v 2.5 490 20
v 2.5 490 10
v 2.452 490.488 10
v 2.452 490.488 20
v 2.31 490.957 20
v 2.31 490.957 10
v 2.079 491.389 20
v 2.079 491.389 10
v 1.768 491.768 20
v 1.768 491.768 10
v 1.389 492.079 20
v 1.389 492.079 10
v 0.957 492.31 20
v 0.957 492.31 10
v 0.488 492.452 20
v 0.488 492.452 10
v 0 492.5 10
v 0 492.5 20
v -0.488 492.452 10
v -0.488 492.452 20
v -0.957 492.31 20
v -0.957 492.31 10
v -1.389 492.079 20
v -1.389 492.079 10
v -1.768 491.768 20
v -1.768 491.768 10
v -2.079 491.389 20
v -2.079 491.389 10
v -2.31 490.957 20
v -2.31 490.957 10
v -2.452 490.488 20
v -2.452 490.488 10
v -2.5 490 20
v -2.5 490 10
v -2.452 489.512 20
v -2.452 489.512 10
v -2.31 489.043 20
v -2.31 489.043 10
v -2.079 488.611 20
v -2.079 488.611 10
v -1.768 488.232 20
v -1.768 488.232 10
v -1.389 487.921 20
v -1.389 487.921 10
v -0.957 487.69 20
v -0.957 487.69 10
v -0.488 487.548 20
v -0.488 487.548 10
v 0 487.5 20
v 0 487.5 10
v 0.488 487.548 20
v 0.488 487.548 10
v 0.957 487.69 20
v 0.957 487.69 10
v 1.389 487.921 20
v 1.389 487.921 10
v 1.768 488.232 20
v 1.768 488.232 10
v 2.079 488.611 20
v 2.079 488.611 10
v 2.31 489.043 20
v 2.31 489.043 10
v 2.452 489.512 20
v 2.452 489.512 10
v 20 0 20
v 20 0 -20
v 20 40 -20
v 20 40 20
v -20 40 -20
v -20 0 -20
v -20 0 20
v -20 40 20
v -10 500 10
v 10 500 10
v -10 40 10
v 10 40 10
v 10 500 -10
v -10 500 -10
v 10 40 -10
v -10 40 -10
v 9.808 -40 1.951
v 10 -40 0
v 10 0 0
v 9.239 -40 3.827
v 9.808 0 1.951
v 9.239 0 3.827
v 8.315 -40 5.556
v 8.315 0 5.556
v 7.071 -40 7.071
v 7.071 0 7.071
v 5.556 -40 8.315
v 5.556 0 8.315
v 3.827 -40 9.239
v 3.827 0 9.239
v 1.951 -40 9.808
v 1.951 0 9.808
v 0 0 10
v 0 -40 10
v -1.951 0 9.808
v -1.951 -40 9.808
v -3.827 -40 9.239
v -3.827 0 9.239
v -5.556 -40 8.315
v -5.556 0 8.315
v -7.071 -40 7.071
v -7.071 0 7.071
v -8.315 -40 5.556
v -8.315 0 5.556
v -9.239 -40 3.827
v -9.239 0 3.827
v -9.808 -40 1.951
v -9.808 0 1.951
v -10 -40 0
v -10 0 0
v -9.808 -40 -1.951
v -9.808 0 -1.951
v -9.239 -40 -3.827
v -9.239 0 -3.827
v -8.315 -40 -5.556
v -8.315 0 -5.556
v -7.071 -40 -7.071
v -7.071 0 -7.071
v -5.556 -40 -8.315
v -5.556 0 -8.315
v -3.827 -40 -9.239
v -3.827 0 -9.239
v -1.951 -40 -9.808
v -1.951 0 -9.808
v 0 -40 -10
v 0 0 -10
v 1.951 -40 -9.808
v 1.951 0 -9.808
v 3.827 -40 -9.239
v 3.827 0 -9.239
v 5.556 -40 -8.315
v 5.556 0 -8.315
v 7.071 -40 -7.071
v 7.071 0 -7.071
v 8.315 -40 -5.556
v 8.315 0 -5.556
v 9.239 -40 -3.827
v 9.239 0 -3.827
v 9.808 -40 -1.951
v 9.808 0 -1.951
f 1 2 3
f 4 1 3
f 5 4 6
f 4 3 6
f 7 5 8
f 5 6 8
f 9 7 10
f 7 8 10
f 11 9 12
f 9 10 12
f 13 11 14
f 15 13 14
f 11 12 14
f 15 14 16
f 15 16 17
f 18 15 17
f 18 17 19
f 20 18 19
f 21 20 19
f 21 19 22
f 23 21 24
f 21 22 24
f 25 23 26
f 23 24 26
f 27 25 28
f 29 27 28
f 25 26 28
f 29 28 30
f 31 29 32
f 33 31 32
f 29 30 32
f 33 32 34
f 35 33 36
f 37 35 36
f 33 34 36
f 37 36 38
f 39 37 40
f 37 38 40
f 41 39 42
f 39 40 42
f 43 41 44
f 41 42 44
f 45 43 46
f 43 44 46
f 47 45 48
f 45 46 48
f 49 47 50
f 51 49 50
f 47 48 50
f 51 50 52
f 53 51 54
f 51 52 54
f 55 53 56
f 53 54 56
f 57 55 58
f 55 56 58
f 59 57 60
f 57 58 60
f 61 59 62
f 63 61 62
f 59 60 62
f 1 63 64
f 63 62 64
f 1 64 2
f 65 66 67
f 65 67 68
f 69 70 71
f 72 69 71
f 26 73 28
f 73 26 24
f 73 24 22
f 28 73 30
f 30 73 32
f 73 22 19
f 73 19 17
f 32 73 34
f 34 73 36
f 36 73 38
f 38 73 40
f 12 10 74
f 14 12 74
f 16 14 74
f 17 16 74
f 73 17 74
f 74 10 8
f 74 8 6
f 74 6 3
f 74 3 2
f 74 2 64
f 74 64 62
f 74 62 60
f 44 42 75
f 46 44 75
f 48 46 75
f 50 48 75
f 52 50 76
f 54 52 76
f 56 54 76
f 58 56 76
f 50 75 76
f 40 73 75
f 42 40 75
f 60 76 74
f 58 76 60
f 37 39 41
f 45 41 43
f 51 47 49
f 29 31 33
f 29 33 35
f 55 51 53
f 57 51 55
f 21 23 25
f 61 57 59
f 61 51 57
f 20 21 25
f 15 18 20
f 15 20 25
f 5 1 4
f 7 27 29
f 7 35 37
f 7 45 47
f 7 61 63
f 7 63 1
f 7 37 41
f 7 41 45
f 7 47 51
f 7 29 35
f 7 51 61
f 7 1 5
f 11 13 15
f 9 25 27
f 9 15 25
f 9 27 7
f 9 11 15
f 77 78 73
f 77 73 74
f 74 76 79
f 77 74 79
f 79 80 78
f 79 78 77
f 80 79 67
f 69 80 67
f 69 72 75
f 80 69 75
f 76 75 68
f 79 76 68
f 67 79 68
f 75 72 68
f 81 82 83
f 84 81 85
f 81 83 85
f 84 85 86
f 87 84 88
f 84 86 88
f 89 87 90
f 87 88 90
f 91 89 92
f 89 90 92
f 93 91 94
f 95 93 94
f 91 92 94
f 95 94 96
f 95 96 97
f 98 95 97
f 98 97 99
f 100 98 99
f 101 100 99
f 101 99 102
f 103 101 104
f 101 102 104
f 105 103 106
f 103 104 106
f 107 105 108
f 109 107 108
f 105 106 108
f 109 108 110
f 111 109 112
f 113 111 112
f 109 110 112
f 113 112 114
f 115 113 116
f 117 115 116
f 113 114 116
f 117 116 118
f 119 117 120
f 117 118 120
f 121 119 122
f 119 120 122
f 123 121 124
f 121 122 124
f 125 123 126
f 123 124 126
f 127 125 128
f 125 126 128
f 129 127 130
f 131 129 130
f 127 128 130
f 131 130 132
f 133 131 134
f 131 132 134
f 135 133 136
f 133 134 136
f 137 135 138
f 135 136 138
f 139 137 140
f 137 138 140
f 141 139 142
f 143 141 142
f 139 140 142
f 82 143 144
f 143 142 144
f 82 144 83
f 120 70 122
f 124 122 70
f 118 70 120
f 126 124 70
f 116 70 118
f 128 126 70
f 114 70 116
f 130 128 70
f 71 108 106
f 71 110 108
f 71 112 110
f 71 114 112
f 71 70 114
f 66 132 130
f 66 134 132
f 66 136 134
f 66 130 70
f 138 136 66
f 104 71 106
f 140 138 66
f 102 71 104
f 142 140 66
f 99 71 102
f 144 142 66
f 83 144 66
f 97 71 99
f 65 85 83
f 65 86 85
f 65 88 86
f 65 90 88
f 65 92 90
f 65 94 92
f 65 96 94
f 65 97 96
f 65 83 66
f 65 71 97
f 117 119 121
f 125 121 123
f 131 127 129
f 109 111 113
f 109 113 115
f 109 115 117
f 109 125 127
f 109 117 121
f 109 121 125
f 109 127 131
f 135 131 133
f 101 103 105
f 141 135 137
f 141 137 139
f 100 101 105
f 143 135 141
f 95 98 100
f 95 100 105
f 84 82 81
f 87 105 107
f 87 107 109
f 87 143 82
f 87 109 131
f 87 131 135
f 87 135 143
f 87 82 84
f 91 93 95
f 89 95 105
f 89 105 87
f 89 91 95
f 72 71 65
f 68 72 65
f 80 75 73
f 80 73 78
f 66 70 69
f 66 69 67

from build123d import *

# Parameters (mm, degrees)
SKETCH1_W           = 20
SKETCH1_H           = 20
BOSS_EXTRUDE1_DEPTH = 500
SKETCH2_W           = 40
SKETCH2_H           = 40
BOSS_EXTRUDE2_DEPTH = 40
SKETCH3_R           = 10
BOSS_EXTRUDE3_DEPTH = 40
SKETCH4_R           = 2.5
BOSS_EXTRUDE4_DEPTH = 10


with BuildPart() as part:
    # Sketch1 → Boss-Extrude1 (new body)
    with BuildSketch(Plane(origin=(0, 0, 0), x_dir=(1, 0, 0), z_dir=(0, 1, 0))):
        Rectangle(SKETCH1_W, SKETCH1_H)
    extrude(amount=BOSS_EXTRUDE1_DEPTH)

    # Sketch2 → Boss-Extrude2 (add)
    with BuildSketch(Plane.XZ):
        Rectangle(SKETCH2_W, SKETCH2_H)
    extrude(amount=-BOSS_EXTRUDE2_DEPTH)

    # Sketch3 → Boss-Extrude3 (add)
    with BuildSketch(Plane.XZ):
        Circle(SKETCH3_R)
    extrude(amount=BOSS_EXTRUDE3_DEPTH)

    # Sketch4 → Boss-Extrude4 (add)
    with BuildSketch(Plane.XY.offset(10)):
        with Locations((0, 490)):
            Circle(SKETCH4_R)
    extrude(amount=BOSS_EXTRUDE4_DEPTH)


solid = part.part
